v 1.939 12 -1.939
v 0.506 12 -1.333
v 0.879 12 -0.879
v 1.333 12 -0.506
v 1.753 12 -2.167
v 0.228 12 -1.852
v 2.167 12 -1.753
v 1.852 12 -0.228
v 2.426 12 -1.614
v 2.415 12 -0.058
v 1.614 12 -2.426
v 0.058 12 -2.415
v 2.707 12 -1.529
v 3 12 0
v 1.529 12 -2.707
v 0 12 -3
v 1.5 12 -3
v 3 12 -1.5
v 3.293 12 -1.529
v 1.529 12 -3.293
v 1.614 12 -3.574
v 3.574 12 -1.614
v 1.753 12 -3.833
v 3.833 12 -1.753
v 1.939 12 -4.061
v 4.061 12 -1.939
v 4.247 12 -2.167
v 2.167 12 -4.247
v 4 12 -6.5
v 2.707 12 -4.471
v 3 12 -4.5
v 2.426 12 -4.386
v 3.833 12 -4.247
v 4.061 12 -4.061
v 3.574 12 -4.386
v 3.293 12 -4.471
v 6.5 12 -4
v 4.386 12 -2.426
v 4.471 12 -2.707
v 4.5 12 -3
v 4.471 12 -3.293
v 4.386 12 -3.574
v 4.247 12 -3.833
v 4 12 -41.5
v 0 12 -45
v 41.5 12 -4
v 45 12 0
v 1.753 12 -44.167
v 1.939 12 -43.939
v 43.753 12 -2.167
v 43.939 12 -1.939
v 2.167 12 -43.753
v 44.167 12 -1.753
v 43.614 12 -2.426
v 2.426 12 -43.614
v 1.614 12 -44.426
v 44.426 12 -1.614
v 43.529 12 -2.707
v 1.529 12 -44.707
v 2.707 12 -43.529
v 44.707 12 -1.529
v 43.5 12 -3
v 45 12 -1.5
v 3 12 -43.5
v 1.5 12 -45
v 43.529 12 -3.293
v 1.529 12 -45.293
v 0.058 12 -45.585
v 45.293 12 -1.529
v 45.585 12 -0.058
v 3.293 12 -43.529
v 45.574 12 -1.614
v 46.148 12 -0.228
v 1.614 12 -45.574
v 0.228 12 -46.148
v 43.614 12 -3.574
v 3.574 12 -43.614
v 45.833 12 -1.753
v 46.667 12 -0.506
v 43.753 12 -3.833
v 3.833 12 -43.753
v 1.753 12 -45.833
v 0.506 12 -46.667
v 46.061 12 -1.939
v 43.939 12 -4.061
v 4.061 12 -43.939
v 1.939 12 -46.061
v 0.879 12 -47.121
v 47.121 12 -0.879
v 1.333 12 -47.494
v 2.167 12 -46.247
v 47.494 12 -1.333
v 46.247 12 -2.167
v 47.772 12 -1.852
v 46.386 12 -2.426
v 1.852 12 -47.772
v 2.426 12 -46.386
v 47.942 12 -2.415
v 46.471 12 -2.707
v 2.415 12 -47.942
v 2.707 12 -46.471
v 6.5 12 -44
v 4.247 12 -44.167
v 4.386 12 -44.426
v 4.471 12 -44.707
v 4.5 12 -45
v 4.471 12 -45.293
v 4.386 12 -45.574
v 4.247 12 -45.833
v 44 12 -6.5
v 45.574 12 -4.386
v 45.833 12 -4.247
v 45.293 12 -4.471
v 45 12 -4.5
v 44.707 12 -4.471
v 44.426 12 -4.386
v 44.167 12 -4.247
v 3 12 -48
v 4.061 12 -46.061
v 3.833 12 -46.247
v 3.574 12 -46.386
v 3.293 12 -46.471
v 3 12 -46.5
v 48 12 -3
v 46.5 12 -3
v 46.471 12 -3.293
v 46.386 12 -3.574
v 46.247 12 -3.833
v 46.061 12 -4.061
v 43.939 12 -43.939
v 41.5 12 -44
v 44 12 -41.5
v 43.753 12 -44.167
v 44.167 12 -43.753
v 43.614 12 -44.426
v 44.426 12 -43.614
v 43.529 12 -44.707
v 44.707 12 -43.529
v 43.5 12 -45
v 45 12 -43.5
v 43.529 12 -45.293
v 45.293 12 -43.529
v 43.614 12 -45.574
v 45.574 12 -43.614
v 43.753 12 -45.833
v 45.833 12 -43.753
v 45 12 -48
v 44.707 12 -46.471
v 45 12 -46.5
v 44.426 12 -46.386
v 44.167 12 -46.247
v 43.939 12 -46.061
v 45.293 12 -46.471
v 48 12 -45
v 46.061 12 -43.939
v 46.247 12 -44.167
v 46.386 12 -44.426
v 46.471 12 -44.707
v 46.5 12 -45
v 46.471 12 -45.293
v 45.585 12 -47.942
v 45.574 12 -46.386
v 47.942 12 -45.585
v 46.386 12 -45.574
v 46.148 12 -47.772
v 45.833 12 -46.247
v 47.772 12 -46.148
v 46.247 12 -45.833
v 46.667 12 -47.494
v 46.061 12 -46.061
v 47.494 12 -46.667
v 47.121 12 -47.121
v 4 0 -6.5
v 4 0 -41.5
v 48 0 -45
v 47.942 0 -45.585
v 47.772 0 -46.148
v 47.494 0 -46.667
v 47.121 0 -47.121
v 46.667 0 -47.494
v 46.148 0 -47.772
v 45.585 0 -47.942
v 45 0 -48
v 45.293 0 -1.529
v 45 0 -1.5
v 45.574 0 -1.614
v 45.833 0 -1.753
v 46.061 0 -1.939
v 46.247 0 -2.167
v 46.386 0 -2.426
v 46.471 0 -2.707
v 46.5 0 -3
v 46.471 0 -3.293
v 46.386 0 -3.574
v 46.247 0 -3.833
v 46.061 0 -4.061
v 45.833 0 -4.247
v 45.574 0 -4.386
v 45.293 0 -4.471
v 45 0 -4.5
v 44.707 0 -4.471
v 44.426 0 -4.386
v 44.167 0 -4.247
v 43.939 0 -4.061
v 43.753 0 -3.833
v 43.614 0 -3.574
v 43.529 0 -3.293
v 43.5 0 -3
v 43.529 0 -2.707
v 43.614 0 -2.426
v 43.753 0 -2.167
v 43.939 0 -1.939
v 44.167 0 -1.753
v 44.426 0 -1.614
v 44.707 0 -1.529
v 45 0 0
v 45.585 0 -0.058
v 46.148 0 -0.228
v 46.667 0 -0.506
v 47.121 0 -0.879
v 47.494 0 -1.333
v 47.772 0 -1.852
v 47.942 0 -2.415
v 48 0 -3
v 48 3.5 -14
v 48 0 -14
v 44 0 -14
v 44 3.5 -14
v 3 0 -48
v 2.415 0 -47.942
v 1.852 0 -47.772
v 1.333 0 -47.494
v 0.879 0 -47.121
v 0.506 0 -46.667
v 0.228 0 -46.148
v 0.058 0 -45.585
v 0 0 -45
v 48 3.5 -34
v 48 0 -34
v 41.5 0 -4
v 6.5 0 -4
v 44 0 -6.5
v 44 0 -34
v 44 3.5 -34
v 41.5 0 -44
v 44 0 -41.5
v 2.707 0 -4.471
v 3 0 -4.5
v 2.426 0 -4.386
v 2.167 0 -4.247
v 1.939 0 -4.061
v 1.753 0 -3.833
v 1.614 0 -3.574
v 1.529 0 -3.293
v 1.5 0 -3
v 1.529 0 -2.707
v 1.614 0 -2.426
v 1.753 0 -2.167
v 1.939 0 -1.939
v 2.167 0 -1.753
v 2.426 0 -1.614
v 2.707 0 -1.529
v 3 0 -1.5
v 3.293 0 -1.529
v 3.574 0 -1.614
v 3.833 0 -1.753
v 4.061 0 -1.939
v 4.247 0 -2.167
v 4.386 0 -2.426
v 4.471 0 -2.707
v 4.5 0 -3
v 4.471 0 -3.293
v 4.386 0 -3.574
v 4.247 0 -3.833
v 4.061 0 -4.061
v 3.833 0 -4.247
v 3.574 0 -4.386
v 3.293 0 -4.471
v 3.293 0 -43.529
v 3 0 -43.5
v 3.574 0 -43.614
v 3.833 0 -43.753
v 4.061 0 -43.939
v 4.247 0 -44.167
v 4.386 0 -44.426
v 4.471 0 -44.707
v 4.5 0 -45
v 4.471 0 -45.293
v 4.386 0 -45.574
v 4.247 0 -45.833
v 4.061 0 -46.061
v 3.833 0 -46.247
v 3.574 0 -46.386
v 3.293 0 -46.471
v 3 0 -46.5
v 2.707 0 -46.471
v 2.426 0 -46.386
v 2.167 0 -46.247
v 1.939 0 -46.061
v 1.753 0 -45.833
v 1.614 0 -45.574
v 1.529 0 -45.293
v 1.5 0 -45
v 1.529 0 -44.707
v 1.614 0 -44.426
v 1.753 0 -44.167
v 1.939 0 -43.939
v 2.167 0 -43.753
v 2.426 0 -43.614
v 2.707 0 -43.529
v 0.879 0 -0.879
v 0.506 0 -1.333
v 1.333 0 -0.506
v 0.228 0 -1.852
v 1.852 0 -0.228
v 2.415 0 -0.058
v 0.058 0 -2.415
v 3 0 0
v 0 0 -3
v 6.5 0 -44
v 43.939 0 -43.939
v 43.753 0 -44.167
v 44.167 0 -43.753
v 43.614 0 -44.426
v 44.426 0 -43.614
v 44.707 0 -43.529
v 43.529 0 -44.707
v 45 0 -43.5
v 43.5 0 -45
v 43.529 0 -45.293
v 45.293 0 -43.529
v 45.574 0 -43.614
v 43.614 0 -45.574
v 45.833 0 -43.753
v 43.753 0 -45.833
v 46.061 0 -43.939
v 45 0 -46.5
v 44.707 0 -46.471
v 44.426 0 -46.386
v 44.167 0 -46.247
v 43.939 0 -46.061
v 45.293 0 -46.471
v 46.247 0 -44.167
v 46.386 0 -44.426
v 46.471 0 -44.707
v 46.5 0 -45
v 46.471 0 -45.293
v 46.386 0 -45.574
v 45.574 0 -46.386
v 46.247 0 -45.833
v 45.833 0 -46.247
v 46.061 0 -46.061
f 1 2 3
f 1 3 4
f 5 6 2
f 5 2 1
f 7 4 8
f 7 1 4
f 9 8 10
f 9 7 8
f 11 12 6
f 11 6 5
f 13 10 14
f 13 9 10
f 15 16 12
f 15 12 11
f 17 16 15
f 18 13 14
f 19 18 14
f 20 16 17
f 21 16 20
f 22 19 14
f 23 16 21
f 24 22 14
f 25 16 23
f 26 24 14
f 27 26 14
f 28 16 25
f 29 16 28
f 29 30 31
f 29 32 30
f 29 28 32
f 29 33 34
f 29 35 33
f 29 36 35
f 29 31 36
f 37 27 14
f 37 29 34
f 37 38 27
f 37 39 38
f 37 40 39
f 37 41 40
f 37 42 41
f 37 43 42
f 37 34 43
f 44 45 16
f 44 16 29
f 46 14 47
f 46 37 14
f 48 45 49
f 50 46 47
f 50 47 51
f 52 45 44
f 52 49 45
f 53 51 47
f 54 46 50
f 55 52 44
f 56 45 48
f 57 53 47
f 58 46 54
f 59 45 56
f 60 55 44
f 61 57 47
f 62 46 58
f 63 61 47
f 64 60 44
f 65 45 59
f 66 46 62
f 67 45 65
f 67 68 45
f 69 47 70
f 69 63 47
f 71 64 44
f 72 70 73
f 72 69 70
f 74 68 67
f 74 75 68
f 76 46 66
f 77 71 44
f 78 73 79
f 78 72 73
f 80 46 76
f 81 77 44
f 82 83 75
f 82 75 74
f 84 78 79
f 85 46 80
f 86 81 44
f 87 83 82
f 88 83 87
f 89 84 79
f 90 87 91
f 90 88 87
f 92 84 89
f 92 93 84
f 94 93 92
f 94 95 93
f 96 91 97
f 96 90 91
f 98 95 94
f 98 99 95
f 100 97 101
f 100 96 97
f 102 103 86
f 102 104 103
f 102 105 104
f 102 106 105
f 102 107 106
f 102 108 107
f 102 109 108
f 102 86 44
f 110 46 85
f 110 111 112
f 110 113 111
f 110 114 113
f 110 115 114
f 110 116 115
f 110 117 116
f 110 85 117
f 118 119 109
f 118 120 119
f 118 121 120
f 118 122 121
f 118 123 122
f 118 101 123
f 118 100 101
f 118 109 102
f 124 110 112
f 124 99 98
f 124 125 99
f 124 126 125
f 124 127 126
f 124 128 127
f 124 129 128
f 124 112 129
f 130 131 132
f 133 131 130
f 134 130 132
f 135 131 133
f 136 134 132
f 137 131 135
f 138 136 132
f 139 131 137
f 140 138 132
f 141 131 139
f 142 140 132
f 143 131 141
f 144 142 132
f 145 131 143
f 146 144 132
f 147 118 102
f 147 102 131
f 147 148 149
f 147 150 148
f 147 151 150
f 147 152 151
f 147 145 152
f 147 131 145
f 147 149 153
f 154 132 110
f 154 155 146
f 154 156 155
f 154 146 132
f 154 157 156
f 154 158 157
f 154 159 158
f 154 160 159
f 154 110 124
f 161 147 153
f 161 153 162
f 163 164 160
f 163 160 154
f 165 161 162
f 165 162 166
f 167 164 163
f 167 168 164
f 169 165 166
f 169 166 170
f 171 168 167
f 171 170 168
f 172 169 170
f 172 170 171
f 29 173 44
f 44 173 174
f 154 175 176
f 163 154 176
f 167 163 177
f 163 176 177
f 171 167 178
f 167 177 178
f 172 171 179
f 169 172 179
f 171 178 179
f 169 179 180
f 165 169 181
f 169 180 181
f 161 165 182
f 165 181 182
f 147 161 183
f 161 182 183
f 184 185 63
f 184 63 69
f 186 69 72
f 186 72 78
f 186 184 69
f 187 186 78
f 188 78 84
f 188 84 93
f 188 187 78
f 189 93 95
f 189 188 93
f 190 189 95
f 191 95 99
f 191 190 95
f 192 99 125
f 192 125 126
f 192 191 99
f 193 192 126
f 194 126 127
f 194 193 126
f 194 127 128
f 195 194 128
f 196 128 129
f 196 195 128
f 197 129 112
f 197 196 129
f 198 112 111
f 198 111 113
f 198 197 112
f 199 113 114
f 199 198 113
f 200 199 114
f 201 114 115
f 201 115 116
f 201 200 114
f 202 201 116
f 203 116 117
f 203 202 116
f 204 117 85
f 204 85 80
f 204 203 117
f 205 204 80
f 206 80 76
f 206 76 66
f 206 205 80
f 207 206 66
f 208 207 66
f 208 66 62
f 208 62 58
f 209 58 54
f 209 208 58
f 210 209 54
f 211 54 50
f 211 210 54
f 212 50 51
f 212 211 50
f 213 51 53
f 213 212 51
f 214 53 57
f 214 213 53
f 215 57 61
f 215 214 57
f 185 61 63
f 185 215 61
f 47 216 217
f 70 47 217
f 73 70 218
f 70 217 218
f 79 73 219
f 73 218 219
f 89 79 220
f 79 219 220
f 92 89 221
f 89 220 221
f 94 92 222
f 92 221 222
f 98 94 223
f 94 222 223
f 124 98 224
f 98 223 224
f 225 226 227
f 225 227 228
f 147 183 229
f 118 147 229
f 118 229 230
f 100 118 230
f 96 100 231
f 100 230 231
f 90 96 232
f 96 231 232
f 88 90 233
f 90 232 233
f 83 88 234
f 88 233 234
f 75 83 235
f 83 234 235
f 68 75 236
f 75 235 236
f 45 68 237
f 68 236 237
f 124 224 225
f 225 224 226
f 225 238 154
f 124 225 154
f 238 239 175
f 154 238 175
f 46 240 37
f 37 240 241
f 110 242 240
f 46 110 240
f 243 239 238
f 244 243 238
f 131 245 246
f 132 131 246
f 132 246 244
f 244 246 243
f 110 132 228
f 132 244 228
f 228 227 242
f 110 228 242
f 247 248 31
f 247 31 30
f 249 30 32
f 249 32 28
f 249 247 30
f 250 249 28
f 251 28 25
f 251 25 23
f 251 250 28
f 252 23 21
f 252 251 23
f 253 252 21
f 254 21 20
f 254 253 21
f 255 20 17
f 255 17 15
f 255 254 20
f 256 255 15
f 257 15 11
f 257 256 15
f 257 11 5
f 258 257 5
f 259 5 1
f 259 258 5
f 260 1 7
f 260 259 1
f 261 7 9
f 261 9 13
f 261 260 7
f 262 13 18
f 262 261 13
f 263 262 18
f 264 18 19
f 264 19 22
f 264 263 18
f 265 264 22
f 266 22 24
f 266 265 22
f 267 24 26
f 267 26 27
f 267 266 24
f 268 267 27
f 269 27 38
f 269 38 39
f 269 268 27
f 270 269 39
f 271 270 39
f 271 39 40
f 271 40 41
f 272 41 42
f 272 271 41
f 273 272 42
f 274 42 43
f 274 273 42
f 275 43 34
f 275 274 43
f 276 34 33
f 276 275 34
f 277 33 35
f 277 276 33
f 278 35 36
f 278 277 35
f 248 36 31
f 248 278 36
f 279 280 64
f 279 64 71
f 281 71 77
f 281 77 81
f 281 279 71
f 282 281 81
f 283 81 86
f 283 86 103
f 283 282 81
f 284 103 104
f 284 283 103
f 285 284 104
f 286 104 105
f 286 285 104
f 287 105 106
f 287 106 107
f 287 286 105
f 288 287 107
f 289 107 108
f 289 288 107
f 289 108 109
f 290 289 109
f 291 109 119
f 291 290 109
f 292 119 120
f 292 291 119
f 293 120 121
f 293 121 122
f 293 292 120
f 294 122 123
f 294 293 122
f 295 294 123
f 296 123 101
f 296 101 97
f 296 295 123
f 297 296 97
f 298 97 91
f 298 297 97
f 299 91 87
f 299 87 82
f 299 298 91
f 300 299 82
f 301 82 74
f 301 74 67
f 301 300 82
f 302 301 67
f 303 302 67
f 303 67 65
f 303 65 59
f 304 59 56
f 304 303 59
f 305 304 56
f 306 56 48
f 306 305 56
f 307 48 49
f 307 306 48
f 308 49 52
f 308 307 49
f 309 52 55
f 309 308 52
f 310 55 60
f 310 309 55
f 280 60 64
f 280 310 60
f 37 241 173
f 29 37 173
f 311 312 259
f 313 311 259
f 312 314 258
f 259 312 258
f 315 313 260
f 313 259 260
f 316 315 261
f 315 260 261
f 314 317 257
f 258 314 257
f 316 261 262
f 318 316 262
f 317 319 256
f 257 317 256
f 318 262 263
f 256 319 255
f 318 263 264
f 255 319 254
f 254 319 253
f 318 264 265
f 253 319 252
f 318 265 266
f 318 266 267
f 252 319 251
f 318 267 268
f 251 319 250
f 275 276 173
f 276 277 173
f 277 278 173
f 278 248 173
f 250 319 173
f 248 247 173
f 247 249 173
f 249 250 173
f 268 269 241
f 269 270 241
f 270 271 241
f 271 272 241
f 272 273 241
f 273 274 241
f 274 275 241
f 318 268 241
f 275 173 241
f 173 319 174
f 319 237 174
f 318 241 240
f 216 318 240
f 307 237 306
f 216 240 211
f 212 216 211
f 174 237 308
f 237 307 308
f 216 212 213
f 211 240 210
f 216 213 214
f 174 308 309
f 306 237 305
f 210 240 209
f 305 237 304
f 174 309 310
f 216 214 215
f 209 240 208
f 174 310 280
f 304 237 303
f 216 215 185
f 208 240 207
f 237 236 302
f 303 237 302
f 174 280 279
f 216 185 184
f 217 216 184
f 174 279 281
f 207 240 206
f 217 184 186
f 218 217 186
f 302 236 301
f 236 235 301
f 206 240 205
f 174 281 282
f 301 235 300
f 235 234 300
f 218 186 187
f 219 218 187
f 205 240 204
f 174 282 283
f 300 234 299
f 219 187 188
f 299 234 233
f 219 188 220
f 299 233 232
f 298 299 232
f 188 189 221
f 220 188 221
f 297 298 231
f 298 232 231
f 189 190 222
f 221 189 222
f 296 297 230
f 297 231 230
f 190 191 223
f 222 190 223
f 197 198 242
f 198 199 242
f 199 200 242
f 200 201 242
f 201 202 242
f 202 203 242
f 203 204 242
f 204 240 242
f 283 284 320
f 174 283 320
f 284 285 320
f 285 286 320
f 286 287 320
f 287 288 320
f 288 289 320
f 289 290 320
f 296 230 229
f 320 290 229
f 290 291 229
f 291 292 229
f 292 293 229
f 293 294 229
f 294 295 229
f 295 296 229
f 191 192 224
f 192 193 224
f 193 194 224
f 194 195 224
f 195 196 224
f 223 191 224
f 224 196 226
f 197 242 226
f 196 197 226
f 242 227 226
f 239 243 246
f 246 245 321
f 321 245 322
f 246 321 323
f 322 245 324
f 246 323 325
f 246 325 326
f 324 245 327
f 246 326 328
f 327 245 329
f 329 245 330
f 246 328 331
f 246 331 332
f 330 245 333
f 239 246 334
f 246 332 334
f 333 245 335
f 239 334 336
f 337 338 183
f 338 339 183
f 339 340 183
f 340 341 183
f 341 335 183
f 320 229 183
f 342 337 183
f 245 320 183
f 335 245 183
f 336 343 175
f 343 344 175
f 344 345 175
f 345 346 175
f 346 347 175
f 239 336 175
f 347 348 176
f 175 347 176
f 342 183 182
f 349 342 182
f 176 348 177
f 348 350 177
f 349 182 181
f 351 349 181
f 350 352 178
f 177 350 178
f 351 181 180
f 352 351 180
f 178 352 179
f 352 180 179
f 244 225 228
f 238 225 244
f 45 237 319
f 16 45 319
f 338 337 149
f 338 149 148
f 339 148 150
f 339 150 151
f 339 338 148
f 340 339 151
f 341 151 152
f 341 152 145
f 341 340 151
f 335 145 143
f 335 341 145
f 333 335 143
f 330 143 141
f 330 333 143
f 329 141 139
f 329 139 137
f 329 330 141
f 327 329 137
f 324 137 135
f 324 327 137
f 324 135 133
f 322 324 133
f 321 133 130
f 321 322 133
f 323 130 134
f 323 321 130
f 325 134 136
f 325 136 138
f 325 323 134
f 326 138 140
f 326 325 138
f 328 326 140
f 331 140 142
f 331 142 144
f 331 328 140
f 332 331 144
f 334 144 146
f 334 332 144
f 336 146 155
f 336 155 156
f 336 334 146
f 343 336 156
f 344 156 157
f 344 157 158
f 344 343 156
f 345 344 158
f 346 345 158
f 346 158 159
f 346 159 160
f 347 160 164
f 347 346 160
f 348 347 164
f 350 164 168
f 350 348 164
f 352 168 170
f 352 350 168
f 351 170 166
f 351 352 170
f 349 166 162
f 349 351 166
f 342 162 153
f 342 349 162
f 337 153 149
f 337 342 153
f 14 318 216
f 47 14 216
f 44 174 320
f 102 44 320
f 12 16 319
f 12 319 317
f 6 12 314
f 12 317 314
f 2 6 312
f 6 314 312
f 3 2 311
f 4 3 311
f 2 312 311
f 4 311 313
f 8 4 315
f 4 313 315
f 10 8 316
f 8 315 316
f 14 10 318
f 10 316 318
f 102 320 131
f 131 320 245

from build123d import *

# Parameters (mm, degrees)
SKETCH3_R           = 1.5
BOSS_EXTRUDE1_DEPTH = 12
SKETCH4_W           = 20
SKETCH4_H           = 3.5
CUT_EXTRUDE1_DEPTH  = 4


with BuildPart() as part:
    # Sketch3 → Boss-Extrude1 (new body)
    with BuildSketch(Plane(origin=(0, 0, 0), x_dir=(1, 0, 0), z_dir=(0, 1, 0))):
        with BuildLine():
            Line((3, 0), (45, 0))
            ThreePointArc((45, 0), (47.121320344, 0.878679656), (48, 3))
            Line((48, 3), (48, 45))
            ThreePointArc((48, 45), (47.121320344, 47.121320344), (45, 48))
            Line((45, 48), (3, 48))
            ThreePointArc((3, 48), (0.878679656, 47.121320344), (0, 45))
            Line((0, 45), (0, 3))
            ThreePointArc((0, 3), (0.878679656, 0.878679656), (3, 0))
        make_face()
        with Locations(Location((3, 45, 0), (0, 0, 270))):
            Circle(SKETCH3_R, mode=Mode.SUBTRACT)
        with Locations(Location((3, 3, 0), (0, 0, 90))):
            Circle(SKETCH3_R, mode=Mode.SUBTRACT)
        with Locations(Location((45, 3, 0), (0, 0, 270))):
            Circle(SKETCH3_R, mode=Mode.SUBTRACT)
        with Locations(Location((45, 45, 0), (0, 0, 90))):
            Circle(SKETCH3_R, mode=Mode.SUBTRACT)
        Polygon((4, 41.5), (6.5, 44), (41.5, 44), (44, 41.5), (44, 6.5), (41.5, 4), (6.5, 4), (4, 6.5), align=None, mode=Mode.SUBTRACT)
    extrude(amount=BOSS_EXTRUDE1_DEPTH)

    # Sketch4 → Cut-Extrude1 (cut)
    with BuildSketch(Plane(origin=(48, 0, 0), x_dir=(0, 0, -1), z_dir=(1, 0, 0))):
        with Locations((24, 1.75)):
            Rectangle(SKETCH4_W, SKETCH4_H)
    extrude(amount=-CUT_EXTRUDE1_DEPTH, mode=Mode.SUBTRACT)


solid = part.part
